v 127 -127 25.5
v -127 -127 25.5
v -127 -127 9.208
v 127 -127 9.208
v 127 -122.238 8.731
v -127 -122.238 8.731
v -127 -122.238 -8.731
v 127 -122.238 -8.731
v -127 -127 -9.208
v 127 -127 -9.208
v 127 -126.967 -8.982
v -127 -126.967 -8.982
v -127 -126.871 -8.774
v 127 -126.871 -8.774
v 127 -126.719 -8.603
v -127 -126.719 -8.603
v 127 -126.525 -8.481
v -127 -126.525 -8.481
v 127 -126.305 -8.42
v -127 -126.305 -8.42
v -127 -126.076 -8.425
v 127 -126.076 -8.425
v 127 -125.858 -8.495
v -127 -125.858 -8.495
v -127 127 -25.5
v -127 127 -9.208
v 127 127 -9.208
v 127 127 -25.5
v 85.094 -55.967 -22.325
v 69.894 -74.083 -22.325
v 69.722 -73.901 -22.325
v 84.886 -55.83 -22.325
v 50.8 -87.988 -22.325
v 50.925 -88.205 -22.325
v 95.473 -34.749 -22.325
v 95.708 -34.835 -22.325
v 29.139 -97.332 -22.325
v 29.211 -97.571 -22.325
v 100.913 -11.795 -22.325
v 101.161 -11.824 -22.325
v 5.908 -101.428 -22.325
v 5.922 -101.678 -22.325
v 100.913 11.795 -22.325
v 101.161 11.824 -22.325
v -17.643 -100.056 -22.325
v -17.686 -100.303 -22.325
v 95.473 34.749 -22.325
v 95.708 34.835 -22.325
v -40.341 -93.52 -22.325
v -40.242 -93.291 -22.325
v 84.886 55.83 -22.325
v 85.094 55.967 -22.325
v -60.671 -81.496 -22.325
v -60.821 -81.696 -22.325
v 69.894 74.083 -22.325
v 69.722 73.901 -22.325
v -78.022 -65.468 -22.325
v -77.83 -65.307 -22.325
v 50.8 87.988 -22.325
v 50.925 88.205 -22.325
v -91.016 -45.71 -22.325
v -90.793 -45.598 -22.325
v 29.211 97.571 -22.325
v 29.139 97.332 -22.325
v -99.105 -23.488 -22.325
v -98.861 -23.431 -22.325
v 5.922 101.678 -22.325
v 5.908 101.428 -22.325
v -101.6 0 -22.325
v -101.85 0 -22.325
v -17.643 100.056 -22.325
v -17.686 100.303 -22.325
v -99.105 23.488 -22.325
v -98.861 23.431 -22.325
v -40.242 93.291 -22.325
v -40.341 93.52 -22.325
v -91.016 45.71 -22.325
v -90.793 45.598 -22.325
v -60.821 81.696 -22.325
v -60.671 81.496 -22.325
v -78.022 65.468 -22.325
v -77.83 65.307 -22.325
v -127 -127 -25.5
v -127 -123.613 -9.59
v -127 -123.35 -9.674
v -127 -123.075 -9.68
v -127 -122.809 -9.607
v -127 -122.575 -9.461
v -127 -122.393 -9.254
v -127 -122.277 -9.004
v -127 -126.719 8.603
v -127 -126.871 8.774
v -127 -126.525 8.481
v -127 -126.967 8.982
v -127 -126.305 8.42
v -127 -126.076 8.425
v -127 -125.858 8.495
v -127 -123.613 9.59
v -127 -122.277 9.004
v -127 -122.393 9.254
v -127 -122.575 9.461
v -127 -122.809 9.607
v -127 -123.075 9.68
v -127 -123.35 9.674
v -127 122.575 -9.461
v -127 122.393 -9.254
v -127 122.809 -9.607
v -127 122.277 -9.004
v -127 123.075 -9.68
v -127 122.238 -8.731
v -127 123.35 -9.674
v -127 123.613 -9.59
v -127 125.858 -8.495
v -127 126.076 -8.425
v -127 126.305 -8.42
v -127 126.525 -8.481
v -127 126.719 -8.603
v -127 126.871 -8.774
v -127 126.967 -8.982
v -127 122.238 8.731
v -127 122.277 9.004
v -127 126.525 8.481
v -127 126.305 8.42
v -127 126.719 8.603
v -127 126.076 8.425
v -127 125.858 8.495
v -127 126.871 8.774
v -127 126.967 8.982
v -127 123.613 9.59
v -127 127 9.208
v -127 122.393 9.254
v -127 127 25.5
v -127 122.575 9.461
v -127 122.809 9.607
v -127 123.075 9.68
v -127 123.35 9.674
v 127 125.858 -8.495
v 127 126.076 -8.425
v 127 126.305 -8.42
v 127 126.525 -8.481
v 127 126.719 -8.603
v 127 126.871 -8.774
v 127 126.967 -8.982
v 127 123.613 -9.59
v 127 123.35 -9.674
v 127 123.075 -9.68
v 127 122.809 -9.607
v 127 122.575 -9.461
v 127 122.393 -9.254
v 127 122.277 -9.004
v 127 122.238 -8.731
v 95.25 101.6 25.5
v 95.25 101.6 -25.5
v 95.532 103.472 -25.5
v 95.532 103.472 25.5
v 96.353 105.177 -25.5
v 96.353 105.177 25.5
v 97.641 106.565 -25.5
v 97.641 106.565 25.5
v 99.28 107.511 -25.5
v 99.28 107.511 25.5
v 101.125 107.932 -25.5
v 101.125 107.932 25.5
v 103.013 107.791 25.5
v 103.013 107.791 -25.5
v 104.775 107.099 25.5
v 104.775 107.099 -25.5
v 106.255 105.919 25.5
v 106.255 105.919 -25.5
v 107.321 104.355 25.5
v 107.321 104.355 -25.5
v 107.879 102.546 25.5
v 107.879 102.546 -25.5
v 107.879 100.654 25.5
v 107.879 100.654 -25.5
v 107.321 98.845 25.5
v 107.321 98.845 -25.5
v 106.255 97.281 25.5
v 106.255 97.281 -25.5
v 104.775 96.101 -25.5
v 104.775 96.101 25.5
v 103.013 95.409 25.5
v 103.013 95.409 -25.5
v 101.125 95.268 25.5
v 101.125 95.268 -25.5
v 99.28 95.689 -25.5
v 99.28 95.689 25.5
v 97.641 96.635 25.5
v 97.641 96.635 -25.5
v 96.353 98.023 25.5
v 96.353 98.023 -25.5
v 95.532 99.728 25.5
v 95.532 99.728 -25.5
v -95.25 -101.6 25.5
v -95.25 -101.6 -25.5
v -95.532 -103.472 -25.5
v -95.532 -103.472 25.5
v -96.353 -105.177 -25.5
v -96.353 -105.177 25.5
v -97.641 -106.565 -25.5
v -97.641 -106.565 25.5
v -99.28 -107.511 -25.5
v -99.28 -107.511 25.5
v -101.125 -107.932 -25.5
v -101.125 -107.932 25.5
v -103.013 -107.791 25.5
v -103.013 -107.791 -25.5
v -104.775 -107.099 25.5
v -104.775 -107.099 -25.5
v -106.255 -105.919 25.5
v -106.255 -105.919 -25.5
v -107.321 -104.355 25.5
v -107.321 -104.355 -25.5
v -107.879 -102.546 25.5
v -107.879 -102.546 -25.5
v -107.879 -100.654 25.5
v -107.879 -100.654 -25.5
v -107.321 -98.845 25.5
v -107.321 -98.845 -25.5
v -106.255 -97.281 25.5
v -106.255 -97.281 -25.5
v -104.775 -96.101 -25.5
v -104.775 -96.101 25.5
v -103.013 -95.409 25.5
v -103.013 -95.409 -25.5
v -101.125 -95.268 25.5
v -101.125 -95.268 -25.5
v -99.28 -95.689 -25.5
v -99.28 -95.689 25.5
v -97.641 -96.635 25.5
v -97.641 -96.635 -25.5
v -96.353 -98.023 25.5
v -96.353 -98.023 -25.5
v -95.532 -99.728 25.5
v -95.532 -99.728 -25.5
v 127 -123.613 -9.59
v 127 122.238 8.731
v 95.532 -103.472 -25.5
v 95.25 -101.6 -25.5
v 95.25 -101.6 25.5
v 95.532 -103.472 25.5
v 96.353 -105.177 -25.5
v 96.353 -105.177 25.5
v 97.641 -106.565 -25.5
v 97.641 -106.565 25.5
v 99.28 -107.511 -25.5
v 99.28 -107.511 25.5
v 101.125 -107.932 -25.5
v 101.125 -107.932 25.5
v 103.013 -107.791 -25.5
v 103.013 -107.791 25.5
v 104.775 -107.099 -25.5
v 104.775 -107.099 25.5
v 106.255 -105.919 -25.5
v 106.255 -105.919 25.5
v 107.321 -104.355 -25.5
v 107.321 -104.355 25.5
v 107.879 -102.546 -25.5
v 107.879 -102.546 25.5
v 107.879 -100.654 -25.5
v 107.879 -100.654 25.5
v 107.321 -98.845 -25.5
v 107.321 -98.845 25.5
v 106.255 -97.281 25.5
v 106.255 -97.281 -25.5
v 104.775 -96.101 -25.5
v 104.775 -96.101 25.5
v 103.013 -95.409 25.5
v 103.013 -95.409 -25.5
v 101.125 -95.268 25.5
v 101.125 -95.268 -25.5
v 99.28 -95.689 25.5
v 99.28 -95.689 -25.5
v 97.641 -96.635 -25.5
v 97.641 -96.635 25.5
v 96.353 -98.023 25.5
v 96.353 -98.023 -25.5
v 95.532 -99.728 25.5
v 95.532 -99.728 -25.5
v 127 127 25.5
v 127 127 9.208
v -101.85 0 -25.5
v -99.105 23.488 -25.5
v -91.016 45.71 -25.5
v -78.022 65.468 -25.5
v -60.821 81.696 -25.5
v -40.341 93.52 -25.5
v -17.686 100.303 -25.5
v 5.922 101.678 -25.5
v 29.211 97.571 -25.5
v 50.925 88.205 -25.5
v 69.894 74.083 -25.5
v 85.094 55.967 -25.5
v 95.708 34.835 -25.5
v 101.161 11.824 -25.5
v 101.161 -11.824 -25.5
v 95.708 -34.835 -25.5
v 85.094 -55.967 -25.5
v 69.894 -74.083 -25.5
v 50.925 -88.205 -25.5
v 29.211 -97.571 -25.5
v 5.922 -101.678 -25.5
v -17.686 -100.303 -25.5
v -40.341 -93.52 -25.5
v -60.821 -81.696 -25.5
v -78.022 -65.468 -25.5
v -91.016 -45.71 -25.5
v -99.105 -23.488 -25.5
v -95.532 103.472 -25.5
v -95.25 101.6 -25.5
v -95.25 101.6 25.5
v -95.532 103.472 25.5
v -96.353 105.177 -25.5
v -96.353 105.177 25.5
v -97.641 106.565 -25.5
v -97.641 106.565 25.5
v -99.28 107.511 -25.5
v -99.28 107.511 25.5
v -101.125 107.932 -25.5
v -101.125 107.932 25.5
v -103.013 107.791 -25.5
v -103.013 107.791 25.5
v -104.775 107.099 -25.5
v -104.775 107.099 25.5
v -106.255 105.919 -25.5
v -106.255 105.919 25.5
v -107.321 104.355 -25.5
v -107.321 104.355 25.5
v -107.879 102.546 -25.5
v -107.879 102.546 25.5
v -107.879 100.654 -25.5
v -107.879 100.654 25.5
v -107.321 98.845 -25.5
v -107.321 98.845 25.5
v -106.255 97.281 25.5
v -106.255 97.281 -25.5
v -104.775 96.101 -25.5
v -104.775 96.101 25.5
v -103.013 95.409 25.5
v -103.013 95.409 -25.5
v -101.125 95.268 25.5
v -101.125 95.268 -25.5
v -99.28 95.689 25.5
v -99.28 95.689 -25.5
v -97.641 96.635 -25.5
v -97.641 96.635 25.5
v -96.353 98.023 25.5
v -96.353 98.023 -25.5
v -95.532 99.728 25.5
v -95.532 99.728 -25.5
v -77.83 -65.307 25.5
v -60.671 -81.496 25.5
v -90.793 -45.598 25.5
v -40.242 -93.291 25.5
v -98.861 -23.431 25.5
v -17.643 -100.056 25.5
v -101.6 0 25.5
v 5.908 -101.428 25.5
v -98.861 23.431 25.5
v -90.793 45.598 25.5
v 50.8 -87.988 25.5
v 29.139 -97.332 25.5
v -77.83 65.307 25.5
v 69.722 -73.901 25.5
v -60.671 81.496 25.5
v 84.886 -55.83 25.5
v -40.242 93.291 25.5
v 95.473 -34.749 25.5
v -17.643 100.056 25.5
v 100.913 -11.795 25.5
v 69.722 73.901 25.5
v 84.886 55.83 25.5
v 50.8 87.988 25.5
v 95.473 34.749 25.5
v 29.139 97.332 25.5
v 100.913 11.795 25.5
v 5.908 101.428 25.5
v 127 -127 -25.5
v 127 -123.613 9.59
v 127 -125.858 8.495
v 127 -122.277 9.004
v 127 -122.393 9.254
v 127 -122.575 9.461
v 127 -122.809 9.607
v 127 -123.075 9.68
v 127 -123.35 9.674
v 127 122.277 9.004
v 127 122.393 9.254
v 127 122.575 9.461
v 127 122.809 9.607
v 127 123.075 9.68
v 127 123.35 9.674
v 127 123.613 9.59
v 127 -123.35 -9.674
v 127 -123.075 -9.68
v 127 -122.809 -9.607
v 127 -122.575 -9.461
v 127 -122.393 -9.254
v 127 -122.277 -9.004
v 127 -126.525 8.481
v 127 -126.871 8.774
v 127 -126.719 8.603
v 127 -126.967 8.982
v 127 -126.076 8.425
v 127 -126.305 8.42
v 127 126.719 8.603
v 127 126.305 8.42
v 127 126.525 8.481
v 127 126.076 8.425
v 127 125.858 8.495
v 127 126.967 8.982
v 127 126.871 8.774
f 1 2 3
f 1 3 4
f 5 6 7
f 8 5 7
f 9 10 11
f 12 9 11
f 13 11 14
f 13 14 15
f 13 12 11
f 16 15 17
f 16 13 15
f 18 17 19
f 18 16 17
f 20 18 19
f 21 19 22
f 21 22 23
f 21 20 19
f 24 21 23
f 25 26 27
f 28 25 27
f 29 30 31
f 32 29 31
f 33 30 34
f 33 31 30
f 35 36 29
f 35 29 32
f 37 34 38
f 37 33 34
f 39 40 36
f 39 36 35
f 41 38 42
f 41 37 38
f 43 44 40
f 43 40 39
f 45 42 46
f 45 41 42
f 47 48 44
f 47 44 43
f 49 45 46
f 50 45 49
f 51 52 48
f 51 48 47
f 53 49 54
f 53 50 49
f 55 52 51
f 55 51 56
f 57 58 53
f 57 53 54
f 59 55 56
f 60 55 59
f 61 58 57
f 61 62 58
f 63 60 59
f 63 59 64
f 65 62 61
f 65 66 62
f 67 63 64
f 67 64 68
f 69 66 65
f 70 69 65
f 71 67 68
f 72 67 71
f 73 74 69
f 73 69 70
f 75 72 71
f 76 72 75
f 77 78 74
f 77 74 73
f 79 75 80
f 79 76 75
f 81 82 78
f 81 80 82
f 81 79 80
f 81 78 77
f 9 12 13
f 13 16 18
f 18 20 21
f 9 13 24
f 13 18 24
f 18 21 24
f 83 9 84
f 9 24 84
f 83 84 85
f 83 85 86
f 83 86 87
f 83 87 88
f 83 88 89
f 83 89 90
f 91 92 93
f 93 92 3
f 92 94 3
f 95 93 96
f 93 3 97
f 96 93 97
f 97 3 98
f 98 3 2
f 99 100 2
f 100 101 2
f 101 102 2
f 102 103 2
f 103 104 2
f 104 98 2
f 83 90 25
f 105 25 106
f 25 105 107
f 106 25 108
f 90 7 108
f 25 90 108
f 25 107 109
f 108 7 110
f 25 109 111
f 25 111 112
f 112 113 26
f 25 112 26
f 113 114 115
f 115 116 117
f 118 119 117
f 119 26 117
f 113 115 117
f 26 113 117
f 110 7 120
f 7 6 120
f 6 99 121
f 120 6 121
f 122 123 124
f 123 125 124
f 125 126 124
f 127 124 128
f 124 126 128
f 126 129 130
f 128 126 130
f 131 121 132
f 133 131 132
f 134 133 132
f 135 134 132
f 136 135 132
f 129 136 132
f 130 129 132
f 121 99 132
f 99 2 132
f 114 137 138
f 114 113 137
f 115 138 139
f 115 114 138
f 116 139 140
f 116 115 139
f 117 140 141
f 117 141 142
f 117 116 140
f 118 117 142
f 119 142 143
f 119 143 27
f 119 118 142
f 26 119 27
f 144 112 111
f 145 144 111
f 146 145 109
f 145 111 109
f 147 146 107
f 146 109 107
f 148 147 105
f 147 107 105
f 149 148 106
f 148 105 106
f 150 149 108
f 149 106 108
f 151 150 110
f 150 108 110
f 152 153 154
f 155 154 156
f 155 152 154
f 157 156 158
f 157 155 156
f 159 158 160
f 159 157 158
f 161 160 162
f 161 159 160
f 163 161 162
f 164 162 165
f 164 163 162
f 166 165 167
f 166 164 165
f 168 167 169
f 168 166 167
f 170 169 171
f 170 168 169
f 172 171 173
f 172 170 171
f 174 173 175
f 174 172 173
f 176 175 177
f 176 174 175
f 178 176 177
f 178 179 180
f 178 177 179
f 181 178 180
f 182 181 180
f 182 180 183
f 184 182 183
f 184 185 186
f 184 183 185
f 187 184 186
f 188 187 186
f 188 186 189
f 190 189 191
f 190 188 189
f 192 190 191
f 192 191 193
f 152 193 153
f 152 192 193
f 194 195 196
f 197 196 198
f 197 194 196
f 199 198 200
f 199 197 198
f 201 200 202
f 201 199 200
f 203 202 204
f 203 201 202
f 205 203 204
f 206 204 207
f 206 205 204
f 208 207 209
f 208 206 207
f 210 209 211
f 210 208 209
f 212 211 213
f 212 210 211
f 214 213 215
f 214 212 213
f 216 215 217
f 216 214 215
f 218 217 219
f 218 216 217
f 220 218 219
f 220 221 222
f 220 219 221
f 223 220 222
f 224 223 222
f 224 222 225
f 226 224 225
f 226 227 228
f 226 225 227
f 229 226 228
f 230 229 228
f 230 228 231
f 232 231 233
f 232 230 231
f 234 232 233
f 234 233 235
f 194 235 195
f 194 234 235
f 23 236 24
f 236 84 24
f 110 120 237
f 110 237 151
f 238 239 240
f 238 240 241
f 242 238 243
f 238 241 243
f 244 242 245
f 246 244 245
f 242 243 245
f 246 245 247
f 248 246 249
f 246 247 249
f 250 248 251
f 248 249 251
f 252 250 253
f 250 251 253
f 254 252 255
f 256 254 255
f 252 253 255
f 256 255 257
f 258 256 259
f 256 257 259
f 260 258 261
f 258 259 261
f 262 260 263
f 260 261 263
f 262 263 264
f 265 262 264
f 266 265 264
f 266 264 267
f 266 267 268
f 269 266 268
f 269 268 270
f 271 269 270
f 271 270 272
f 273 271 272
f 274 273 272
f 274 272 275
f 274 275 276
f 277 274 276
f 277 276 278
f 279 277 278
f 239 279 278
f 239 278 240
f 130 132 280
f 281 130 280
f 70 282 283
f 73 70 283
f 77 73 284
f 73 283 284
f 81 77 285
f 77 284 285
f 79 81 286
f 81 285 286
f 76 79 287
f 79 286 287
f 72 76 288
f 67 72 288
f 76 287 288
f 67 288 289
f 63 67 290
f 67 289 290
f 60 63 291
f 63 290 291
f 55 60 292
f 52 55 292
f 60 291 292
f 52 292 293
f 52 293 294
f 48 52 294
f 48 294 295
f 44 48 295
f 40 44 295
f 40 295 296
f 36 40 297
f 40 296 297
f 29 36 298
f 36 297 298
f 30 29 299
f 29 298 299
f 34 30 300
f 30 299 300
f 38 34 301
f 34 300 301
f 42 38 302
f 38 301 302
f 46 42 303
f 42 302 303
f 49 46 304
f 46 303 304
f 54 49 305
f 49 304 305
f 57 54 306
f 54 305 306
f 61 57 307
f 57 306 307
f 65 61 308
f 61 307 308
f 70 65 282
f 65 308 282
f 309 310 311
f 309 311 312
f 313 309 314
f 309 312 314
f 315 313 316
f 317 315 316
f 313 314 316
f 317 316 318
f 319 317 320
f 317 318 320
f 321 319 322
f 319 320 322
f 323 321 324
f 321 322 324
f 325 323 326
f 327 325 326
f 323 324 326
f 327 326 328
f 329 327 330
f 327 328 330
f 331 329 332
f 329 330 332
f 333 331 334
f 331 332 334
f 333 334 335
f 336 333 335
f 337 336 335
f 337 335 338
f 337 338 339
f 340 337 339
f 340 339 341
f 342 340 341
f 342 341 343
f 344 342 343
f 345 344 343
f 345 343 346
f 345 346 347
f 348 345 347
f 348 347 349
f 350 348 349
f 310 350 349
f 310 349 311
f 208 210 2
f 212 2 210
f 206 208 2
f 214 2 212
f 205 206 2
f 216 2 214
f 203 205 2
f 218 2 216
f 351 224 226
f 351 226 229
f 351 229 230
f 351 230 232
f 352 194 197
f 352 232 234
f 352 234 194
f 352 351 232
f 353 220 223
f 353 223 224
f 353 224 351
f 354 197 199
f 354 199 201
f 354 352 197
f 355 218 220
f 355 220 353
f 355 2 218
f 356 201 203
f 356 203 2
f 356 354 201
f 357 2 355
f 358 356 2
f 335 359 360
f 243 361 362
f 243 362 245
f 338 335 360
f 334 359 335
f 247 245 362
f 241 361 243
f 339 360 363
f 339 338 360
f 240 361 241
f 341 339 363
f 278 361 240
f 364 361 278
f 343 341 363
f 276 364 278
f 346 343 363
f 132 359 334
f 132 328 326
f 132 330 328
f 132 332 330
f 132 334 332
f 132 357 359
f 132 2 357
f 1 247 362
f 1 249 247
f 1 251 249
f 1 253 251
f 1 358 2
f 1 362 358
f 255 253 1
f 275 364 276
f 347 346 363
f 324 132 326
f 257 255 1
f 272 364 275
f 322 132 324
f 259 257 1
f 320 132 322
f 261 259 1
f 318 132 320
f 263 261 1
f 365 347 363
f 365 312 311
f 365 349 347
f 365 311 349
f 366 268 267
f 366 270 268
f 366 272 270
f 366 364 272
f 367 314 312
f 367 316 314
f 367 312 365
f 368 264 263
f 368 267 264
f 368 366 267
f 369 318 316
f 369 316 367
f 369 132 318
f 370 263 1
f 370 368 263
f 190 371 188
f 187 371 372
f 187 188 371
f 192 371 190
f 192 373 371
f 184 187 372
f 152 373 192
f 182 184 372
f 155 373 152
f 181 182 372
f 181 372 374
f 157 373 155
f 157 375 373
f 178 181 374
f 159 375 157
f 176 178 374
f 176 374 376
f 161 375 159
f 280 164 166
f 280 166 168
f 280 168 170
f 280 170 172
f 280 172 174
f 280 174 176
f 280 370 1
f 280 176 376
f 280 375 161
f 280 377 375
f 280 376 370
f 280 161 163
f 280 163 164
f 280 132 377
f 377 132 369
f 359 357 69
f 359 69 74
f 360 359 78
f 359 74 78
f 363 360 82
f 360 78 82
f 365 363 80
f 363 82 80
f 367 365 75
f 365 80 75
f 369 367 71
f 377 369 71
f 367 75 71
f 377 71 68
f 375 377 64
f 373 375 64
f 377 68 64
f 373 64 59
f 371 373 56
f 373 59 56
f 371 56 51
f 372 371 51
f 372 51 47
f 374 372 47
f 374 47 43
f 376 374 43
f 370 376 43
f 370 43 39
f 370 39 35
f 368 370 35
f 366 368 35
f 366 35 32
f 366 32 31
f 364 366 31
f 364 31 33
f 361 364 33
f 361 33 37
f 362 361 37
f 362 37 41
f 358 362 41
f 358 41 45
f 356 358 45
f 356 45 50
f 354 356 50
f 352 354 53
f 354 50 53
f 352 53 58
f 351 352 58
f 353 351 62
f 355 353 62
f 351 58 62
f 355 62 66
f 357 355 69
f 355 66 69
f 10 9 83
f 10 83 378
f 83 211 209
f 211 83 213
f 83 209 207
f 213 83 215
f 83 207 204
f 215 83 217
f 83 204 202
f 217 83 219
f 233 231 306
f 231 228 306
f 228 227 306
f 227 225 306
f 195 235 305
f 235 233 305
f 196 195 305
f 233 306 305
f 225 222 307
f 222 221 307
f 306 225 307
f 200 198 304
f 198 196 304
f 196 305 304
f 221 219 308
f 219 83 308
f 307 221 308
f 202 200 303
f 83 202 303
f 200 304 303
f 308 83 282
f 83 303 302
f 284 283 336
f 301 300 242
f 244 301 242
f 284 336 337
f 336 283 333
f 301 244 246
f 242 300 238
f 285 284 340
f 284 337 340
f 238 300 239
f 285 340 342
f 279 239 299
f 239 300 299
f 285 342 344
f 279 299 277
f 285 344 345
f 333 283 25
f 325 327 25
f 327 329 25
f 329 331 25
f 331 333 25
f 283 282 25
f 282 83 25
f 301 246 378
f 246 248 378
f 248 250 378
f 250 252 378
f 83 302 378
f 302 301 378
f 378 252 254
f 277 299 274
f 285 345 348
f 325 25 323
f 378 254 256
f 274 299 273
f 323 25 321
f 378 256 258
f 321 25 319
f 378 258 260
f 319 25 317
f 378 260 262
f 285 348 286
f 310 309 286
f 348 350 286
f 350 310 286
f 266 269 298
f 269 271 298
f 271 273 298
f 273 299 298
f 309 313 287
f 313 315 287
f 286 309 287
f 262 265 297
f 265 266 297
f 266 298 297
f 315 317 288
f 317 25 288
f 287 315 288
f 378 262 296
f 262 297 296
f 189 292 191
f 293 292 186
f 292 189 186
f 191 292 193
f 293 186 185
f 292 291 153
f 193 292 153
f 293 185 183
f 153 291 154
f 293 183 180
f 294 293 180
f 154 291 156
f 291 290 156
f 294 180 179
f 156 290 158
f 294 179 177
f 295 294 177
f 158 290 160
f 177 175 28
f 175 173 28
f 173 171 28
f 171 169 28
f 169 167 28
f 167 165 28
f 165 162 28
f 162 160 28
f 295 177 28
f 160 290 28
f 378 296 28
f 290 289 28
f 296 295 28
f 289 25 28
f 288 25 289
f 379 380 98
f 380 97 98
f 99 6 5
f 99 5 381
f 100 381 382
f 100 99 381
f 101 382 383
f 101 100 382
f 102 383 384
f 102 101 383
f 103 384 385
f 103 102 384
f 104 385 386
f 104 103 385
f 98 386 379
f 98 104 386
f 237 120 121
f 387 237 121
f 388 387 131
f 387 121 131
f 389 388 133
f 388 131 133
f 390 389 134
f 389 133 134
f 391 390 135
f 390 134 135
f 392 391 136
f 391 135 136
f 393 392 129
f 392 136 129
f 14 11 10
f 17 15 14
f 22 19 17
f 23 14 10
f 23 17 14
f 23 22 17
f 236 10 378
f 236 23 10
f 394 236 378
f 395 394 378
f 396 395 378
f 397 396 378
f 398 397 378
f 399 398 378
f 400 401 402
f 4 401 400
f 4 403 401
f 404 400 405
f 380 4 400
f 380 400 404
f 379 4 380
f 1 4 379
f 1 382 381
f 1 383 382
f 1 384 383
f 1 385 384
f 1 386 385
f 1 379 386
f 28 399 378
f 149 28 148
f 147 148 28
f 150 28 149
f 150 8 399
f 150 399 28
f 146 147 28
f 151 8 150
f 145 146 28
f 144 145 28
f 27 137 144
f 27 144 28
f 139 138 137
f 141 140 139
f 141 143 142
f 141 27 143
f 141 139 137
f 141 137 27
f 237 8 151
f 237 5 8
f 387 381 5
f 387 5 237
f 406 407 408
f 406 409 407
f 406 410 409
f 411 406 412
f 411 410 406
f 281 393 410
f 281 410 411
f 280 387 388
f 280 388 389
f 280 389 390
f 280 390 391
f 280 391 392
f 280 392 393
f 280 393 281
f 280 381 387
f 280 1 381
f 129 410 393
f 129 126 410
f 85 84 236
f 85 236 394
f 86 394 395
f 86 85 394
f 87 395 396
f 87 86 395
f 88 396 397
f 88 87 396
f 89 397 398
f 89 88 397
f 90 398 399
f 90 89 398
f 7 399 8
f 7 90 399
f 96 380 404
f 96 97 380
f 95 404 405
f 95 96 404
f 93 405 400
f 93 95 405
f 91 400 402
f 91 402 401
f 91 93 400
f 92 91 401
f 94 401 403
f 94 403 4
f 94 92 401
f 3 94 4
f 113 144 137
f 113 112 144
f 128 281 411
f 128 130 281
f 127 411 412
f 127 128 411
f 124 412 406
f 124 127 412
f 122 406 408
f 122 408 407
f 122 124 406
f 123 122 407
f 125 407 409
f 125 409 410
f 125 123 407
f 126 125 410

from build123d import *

# Parameters (mm, degrees)
SKETCH1_W               = 254
SKETCH1_H               = 254
BASE_EXTRUDE_DEPTH      = 25.5
FILLET4_R               = 0.79375
FILLET4_OF_MIRROR3_R    = 0.79375
SKETCH4_R               = 6.35
CUT_EXTRUDE1_DEPTH      = 187.705650691
MIRROR2_COPY_1_SKETCH_R = 6.35
MIRROR2_COPY_1_DEPTH    = 187.705650691
SKETCH5_R               = 101.85
SKETCH5_R_2             = 101.6
CUT_EXTRUDE2_DEPTH      = 3.175
SKETCH7_R               = 101.6
CUT_EXTRUDE3_DEPTH      = 187.705650691


with BuildPart() as part:
    # Sketch1 → Base-Extrude (new, symmetric)
    with BuildSketch(Plane.XY):
        Rectangle(SKETCH1_W, SKETCH1_H)
    extrude(amount=BASE_EXTRUDE_DEPTH, both=True)

    # Cut-Sweep1: sweep along a path in Sketch3
    with BuildLine(Plane.XY) as cut_sweep1_path:
        Line((127, 127), (-127, 127))
    # Sketch2 → Cut-Sweep1 (sweep, cut)
    with BuildSketch(Plane(origin=(127, 0, 0), x_dir=(0, 0, -1), z_dir=(1, 0, 0))):
        with BuildLine():
            Line((-7.9375, 127), (7.9375, 127))
            Line((7.9375, 127), (9.590397866, 123.612719875))
            ThreePointArc((9.590397866, 123.612719875), (9.542015805, 122.686966067), (8.73125, 122.2375))
            Line((8.73125, 122.2375), (-8.73125, 122.2375))
            ThreePointArc((-8.73125, 122.2375), (-9.542015805, 122.686966067), (-9.590397866, 123.612719875))
            Line((-9.590397866, 123.612719875), (-7.9375, 127))
        make_face()
    cut_sweep1 = sweep(path=cut_sweep1_path.line, mode=Mode.SUBTRACT)

    # Fillet4
    fillet4_edges = [part.edges().sort_by_distance(p)[0] for p in [
        (0, 127, 7.9375),
        (0, 127, -7.9375),
    ]]
    fillet(fillet4_edges, radius=FILLET4_R)

    # Mirror3: Cut-Sweep1 across plane
    add(cut_sweep1.mirror(Plane.ZX), mode=Mode.SUBTRACT)

    # Fillet4 of Mirror3
    fillet4_of_mirror3_edges = [part.edges().sort_by_distance(p)[0] for p in [
        (0, -127, 7.9375),
        (0, -127, -7.9375),
    ]]
    fillet(fillet4_of_mirror3_edges, radius=FILLET4_OF_MIRROR3_R)

    # Sketch4 → Cut-Extrude1 (cut, through all)
    with BuildSketch(Plane.XY.offset(25.5)):
        with Locations((-101.6, 101.6)):
            Circle(SKETCH4_R)
    cut_extrude1 = extrude(amount=-CUT_EXTRUDE1_DEPTH, mode=Mode.SUBTRACT)

    # Mirror1: Cut-Extrude1 across plane
    add(cut_extrude1.mirror(Plane.ZX), mode=Mode.SUBTRACT)

    # Mirror2: Cut-Extrude1 across plane
    add(cut_extrude1.mirror(Plane(origin=(0, 0, 0), x_dir=(0, 0, 1), z_dir=(1, 0, 0))), mode=Mode.SUBTRACT)

    # Mirror2 copy 1 sketch → Mirror2 copy 1 (cut, through all)
    with BuildSketch(Plane(origin=(0, 0, 25.5), x_dir=(-1, 0, 0), z_dir=(0, 0, 1))):
        with Locations((-101.6, 101.6)):
            Circle(MIRROR2_COPY_1_SKETCH_R)
    extrude(amount=-MIRROR2_COPY_1_DEPTH, mode=Mode.SUBTRACT)

    # Sketch5 → Cut-Extrude2 (cut)
    with BuildSketch(Plane(origin=(0, 0, -25.5), x_dir=(-1, 0, 0), z_dir=(0, 0, -1))):
        Circle(SKETCH5_R)
        Circle(SKETCH5_R_2, mode=Mode.SUBTRACT)
    extrude(amount=-CUT_EXTRUDE2_DEPTH, mode=Mode.SUBTRACT)

    # Sketch7 → Cut-Extrude3 (cut, through all)
    with BuildSketch(Plane(origin=(0, 0, -25.5), x_dir=(-1, 0, 0), z_dir=(0, 0, -1))):
        Circle(SKETCH7_R)
    extrude(amount=-CUT_EXTRUDE3_DEPTH, mode=Mode.SUBTRACT)


solid = part.part
